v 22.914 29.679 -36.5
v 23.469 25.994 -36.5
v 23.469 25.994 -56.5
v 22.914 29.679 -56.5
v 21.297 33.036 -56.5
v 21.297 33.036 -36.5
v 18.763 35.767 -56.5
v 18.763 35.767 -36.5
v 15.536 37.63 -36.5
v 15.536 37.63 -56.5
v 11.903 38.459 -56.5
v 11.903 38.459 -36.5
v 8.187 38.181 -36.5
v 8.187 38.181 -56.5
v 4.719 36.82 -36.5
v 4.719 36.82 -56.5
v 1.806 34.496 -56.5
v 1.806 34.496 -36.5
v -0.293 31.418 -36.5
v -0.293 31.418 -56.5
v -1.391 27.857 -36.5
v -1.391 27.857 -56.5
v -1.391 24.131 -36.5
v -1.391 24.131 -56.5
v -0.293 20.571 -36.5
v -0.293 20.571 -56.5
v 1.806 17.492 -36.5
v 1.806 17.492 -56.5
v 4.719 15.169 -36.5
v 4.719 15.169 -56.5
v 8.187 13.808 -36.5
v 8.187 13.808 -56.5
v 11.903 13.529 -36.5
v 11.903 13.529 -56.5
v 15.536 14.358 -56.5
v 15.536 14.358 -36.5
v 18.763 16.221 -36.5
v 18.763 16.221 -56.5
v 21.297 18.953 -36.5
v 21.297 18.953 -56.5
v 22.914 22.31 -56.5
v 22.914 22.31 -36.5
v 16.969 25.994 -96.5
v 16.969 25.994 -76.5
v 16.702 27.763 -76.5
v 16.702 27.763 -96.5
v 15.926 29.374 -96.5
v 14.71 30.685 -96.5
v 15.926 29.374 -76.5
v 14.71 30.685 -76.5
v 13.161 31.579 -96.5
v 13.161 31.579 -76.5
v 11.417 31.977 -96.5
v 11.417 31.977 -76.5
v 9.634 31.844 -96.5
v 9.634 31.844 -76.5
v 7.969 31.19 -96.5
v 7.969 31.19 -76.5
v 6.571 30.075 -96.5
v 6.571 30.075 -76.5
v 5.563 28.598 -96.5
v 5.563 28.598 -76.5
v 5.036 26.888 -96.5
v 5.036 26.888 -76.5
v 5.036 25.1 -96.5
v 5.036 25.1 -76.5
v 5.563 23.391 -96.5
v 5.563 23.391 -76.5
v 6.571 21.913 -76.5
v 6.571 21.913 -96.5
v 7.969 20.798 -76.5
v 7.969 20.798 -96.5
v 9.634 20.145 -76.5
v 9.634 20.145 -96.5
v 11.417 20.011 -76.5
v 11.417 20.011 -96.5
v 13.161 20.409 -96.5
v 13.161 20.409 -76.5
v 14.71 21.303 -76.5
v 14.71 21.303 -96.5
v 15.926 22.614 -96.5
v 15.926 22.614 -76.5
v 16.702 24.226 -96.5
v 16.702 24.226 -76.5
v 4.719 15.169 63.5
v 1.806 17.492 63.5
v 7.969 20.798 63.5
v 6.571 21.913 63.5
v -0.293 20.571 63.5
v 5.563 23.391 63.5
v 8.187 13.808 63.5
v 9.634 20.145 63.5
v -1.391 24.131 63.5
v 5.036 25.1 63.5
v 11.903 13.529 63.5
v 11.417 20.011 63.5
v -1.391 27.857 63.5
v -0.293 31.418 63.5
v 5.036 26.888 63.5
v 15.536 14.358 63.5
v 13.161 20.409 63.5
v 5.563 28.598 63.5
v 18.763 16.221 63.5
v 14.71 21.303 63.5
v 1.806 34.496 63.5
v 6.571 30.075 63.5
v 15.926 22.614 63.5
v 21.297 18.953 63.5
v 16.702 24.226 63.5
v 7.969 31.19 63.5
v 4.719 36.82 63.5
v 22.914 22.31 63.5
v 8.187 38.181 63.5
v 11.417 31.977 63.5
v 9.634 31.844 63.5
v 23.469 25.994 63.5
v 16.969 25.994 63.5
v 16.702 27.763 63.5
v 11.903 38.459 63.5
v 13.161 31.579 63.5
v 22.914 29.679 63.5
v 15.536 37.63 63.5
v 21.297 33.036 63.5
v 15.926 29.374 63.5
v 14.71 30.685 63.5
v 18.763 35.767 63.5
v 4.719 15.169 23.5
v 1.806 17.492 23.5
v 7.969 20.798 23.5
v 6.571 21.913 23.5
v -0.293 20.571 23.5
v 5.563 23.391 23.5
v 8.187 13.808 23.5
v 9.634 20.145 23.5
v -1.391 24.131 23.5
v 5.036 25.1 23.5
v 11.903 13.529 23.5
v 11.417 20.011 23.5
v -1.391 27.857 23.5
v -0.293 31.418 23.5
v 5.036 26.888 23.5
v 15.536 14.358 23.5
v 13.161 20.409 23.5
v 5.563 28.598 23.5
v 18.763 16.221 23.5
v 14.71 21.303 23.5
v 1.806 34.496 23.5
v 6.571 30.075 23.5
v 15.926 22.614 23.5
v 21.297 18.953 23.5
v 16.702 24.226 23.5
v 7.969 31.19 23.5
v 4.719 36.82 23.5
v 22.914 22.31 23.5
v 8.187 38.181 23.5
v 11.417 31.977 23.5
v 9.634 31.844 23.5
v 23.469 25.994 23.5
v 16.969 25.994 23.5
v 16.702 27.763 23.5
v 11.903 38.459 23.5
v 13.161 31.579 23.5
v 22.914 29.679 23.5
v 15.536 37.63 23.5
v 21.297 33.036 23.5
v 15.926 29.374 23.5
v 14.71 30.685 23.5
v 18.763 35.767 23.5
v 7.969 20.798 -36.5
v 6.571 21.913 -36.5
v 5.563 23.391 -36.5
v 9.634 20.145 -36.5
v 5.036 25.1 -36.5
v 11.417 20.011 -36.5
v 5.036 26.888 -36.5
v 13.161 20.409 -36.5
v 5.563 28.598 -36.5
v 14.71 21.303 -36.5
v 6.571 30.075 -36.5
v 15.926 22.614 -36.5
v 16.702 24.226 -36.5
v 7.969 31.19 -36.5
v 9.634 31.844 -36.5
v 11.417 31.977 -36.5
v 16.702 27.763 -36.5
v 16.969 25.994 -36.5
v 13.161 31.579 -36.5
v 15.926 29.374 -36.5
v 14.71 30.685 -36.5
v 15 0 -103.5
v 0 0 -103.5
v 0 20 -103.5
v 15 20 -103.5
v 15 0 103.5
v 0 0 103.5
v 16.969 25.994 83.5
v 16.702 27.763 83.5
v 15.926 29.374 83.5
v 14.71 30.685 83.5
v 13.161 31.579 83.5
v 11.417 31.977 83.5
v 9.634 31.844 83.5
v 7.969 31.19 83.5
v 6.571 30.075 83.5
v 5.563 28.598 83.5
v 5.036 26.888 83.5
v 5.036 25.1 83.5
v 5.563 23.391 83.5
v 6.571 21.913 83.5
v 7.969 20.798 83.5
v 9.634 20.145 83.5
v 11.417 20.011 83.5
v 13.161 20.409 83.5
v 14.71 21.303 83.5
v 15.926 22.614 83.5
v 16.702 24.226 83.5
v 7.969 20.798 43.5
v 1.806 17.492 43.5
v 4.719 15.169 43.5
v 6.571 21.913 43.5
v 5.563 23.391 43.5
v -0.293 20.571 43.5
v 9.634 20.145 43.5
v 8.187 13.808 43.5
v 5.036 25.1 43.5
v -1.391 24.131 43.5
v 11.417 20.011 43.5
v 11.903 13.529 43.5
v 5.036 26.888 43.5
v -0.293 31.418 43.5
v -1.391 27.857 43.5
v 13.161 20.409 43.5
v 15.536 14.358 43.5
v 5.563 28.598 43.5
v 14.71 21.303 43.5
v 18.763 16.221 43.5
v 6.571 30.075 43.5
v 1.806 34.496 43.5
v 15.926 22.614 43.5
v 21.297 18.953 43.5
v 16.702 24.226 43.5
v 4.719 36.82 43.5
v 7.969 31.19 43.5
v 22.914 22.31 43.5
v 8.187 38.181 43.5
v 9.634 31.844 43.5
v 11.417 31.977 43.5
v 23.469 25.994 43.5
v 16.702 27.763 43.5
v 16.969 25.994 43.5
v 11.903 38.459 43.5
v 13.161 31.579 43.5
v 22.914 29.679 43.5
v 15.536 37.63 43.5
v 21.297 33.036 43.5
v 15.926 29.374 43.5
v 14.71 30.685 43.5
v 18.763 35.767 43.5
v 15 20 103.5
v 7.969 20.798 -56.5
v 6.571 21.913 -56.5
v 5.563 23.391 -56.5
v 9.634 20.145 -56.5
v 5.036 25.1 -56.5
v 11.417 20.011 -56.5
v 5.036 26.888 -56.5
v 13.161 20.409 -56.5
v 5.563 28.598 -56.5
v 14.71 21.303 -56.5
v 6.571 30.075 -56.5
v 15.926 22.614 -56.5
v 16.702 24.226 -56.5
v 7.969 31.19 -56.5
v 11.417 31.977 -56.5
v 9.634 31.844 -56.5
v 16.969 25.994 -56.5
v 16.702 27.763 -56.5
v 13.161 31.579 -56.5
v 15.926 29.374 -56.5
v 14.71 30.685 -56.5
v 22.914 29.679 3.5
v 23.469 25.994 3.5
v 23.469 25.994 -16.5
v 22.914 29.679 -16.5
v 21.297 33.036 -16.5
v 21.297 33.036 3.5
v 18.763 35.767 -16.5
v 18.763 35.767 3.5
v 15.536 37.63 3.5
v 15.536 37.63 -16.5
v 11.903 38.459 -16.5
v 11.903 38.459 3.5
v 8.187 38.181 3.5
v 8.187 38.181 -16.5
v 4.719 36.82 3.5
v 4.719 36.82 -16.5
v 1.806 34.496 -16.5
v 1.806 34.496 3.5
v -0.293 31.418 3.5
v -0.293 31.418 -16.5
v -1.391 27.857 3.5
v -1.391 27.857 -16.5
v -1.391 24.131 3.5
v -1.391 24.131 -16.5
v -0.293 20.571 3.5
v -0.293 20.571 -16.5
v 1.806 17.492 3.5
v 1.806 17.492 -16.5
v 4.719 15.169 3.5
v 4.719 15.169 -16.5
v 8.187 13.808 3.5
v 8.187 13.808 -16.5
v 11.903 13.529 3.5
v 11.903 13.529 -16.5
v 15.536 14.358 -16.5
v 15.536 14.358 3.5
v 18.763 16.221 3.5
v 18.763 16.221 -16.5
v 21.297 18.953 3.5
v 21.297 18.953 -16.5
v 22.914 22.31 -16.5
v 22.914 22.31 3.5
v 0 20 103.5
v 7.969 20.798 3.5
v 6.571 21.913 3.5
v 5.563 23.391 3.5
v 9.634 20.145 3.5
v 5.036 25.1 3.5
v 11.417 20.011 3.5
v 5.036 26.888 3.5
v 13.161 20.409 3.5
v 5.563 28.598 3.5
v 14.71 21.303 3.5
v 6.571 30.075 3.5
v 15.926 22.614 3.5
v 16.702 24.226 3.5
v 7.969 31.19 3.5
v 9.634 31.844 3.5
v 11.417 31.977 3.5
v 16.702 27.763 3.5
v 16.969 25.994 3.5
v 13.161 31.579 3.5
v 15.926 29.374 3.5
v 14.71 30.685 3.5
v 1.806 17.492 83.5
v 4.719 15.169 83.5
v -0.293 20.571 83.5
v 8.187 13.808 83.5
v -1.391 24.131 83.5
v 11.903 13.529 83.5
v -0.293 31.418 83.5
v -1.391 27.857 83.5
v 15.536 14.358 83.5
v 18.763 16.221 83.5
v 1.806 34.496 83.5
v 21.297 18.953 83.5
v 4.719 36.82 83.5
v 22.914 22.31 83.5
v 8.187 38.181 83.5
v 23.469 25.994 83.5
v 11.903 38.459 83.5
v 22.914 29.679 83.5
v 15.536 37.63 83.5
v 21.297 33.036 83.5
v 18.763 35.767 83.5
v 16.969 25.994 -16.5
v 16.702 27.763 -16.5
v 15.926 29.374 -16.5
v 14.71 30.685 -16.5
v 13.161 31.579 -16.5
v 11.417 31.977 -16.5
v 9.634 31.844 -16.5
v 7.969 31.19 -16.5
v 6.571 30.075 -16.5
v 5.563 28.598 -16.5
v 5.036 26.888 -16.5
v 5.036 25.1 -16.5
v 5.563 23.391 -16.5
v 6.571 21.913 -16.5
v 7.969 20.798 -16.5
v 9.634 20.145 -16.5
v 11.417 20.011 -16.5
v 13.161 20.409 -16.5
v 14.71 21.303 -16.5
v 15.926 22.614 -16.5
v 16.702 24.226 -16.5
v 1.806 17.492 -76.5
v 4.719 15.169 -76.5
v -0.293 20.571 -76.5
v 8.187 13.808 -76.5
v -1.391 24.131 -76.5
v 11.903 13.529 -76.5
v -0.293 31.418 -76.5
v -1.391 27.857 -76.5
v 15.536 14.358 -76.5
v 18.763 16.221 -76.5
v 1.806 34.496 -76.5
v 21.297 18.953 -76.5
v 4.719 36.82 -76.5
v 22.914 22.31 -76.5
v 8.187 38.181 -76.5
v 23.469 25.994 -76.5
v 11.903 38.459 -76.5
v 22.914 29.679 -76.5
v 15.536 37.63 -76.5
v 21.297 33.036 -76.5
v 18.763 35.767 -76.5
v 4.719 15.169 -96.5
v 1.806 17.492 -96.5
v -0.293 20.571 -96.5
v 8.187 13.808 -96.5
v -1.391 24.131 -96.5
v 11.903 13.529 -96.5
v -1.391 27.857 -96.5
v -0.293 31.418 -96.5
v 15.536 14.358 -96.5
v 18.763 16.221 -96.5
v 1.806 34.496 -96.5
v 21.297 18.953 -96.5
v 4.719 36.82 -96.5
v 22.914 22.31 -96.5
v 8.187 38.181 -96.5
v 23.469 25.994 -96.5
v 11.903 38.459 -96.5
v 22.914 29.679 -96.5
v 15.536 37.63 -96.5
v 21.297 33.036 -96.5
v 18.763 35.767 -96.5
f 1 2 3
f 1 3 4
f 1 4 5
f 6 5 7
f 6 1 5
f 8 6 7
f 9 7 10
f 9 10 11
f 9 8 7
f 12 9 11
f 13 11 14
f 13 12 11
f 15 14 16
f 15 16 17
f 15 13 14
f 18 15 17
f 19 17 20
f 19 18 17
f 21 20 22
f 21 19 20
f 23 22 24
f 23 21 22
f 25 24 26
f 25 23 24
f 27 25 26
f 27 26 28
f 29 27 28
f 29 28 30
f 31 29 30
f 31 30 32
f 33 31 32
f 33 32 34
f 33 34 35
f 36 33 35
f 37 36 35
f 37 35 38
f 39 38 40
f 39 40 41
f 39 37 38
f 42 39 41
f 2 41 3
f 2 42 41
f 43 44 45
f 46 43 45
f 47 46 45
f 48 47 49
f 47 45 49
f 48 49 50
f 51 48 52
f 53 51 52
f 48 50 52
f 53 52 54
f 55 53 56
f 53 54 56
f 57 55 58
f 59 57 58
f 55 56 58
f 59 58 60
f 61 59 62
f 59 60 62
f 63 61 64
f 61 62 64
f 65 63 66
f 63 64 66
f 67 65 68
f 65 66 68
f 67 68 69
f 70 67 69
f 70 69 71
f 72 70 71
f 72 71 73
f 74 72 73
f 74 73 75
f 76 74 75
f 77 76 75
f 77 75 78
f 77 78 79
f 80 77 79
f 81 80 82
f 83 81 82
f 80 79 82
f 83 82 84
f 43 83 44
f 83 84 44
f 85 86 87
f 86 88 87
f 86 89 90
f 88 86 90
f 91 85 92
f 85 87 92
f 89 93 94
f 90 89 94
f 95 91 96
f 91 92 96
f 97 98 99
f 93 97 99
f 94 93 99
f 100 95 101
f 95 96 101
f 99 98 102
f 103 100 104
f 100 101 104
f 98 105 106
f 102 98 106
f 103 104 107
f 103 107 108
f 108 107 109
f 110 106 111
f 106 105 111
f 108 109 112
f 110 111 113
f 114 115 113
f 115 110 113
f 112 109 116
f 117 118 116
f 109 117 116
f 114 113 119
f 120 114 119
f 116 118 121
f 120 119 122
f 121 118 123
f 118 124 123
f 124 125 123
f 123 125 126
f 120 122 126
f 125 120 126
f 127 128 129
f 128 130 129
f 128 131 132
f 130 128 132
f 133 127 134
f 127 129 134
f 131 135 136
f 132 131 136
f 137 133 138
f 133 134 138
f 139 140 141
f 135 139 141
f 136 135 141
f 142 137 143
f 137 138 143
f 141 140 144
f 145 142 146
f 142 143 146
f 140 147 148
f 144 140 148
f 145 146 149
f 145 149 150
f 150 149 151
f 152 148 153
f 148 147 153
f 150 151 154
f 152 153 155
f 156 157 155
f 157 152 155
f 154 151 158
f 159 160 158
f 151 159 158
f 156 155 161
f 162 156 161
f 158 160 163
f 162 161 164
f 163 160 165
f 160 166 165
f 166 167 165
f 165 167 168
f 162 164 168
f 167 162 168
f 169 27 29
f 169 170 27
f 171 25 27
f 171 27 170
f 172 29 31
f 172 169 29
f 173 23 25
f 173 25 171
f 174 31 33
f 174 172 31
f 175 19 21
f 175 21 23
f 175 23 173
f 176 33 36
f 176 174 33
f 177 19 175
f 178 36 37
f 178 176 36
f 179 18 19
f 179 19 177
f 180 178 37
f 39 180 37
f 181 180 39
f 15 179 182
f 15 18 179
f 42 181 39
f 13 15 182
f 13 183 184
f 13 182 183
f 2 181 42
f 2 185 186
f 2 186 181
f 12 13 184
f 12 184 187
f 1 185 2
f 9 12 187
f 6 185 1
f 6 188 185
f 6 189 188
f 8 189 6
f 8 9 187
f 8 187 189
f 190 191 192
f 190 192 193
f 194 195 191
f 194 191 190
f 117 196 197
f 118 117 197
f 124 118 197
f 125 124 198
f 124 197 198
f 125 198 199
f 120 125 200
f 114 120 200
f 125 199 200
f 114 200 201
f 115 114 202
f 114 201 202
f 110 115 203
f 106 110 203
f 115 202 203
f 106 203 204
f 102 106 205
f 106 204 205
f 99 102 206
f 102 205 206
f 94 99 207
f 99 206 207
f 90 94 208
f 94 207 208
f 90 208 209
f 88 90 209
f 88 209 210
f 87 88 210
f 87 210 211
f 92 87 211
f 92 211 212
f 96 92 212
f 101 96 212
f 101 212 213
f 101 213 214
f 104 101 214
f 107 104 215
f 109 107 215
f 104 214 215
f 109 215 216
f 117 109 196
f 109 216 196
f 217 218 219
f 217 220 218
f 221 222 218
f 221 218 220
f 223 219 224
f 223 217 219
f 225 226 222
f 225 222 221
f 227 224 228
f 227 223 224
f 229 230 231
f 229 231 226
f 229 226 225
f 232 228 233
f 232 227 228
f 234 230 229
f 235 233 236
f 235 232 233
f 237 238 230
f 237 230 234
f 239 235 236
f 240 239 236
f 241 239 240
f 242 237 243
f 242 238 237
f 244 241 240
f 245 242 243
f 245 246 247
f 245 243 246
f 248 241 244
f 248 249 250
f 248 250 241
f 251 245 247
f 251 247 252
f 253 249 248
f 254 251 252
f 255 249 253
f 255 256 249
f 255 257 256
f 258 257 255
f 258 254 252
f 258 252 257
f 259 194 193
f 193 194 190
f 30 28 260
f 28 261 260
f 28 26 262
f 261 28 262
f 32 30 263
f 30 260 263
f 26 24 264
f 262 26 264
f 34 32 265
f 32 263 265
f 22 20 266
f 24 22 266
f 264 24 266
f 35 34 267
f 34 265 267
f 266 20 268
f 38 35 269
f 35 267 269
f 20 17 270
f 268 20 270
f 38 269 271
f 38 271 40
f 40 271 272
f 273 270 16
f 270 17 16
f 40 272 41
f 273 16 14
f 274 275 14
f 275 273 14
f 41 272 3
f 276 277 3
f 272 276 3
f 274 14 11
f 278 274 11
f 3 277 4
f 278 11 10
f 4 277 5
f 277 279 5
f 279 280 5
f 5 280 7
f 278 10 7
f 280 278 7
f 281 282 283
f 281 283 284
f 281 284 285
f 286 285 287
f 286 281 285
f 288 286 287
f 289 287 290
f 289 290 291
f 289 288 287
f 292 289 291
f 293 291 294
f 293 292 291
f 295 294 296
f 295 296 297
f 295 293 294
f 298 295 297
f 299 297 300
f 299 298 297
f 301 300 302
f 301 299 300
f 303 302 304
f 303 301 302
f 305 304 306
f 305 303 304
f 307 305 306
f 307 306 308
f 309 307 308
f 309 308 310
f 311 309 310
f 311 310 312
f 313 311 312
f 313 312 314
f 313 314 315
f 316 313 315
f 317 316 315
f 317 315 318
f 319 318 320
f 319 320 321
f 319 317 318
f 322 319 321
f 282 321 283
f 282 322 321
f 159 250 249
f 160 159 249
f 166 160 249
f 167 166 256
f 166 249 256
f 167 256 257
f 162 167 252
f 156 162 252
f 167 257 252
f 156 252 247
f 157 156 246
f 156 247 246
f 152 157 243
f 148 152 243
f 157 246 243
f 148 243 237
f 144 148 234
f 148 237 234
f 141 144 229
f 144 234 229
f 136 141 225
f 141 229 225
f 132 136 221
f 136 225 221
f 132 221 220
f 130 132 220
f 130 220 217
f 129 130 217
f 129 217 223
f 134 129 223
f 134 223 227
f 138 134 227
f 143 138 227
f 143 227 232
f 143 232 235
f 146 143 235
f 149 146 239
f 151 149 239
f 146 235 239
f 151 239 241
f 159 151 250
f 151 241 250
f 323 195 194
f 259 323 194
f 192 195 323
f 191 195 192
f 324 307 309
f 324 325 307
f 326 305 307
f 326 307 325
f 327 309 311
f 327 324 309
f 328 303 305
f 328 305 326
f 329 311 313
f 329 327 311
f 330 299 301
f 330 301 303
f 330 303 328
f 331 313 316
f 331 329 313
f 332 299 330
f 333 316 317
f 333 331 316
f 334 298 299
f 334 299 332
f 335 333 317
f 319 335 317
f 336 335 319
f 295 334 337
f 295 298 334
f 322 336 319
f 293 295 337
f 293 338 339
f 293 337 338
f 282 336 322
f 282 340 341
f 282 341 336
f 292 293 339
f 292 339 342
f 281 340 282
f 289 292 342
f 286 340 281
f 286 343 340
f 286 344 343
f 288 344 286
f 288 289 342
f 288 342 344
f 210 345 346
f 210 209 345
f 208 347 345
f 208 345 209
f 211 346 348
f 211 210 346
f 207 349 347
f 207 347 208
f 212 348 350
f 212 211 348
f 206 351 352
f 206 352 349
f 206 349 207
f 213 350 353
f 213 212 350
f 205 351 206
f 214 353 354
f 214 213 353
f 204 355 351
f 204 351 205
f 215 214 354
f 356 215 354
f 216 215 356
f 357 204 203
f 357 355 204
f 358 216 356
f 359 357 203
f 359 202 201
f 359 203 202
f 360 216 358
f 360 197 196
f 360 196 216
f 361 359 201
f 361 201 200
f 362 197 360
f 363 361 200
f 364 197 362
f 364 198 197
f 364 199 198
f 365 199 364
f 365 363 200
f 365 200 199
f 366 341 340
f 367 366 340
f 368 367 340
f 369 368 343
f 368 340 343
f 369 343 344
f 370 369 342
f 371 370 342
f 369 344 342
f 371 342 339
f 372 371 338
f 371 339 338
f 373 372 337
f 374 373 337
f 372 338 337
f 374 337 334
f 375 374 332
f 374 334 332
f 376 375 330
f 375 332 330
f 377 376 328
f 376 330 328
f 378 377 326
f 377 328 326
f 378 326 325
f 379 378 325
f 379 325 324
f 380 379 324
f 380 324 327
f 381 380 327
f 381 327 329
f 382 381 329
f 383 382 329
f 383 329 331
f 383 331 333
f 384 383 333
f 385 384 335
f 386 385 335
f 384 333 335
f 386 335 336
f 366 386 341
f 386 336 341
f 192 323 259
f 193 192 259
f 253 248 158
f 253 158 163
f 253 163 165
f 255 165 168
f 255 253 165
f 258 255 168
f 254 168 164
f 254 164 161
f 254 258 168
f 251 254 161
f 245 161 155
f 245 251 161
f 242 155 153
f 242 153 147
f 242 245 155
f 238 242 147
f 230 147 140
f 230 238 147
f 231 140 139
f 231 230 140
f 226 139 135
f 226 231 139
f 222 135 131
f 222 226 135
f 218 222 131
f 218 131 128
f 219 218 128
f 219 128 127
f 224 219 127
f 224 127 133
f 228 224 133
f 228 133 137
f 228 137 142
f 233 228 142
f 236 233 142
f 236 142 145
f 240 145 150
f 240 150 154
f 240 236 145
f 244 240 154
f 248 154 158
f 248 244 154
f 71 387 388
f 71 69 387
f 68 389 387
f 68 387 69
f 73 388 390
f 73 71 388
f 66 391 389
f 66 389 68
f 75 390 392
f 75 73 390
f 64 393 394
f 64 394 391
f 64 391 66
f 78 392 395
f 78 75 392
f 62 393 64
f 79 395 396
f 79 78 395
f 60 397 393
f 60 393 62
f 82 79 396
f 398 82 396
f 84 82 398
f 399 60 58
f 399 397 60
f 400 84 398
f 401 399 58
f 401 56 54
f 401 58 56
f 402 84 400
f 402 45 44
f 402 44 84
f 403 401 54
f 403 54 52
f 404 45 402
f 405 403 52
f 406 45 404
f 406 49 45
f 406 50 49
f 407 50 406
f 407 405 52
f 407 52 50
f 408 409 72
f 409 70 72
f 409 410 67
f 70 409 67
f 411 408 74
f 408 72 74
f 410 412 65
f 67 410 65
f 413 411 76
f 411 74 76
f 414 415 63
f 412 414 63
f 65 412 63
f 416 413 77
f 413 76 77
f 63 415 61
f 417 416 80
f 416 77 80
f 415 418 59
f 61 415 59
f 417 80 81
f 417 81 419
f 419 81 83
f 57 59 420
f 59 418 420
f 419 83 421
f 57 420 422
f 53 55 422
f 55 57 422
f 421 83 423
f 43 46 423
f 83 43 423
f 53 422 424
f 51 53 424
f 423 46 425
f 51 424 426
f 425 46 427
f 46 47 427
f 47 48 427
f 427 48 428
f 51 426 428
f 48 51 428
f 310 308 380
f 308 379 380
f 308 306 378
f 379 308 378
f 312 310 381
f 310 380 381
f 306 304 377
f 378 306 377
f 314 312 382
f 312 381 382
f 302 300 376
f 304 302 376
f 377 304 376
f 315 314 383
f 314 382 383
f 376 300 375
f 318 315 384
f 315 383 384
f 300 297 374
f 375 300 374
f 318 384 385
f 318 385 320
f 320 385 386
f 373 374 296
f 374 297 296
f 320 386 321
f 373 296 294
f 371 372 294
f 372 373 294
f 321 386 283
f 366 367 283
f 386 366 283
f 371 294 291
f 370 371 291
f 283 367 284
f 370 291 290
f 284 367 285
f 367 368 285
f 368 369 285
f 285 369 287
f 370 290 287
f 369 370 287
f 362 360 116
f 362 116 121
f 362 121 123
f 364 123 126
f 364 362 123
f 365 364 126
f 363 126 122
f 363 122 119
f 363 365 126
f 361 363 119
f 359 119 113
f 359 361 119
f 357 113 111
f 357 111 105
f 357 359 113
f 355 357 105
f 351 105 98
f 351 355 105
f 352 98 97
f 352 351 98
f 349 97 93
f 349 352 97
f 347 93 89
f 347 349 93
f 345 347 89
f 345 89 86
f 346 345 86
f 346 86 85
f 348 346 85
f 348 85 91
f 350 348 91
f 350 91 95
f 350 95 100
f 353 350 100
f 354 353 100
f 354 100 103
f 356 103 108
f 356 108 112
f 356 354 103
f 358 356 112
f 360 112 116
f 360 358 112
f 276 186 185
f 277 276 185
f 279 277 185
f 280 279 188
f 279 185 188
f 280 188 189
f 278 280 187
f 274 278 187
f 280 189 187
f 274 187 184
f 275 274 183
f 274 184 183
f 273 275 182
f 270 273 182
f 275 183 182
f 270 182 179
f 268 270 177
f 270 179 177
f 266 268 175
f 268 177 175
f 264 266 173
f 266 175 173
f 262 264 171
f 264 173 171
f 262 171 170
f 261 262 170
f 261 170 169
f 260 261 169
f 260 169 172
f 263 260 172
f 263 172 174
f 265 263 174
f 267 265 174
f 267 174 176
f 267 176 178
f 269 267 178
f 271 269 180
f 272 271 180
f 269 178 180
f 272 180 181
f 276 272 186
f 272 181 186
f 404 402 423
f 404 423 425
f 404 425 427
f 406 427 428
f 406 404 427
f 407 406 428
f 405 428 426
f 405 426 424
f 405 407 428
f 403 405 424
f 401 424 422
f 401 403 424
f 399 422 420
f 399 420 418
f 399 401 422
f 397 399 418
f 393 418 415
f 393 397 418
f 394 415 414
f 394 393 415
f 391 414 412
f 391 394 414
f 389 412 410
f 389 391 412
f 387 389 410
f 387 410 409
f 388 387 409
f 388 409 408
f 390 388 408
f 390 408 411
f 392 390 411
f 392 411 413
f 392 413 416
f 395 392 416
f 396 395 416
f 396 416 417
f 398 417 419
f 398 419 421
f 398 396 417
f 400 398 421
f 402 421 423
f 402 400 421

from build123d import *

# Parameters (mm, degrees)
SKETCH1_W           = 15
SKETCH1_H           = 207
BOSS_EXTRUDE1_DEPTH = 20
SKETCH2_R           = 12.5
SKETCH2_R_2         = 6
BOSS_EXTRUDE3_DEPTH = 20
LPATTERN2_COUNT     = 5
LPATTERN2_PITCH     = 40


with BuildPart() as part:
    # Sketch1 → Boss-Extrude1 (new body)
    with BuildSketch(Plane(origin=(0, 0, 0), x_dir=(1, 0, 0), z_dir=(0, 1, 0))):
        with Locations((7.5, 0)):
            Rectangle(SKETCH1_W, SKETCH1_H)
    extrude(amount=BOSS_EXTRUDE1_DEPTH)


with BuildPart() as body_2:
    # Sketch2 → Boss-Extrude3 (new body)
    with BuildSketch(Plane.XY.offset(83.5)):
        with Locations((10.969005493, 25.994240443)):
            Circle(SKETCH2_R)
        with Locations((10.969005493, 25.994240443)):
            Circle(SKETCH2_R_2, mode=Mode.SUBTRACT)
    boss_extrude3 = extrude(amount=-BOSS_EXTRUDE3_DEPTH)


with BuildPart() as lpattern2_1:
    # LPattern2: Boss-Extrude3 ×5
    with Locations(*[(0, 0, -i * LPATTERN2_PITCH) for i in range(1, LPATTERN2_COUNT)]):
        add(boss_extrude3)


solid = Compound([part.part, body_2.part, lpattern2_1.part])
